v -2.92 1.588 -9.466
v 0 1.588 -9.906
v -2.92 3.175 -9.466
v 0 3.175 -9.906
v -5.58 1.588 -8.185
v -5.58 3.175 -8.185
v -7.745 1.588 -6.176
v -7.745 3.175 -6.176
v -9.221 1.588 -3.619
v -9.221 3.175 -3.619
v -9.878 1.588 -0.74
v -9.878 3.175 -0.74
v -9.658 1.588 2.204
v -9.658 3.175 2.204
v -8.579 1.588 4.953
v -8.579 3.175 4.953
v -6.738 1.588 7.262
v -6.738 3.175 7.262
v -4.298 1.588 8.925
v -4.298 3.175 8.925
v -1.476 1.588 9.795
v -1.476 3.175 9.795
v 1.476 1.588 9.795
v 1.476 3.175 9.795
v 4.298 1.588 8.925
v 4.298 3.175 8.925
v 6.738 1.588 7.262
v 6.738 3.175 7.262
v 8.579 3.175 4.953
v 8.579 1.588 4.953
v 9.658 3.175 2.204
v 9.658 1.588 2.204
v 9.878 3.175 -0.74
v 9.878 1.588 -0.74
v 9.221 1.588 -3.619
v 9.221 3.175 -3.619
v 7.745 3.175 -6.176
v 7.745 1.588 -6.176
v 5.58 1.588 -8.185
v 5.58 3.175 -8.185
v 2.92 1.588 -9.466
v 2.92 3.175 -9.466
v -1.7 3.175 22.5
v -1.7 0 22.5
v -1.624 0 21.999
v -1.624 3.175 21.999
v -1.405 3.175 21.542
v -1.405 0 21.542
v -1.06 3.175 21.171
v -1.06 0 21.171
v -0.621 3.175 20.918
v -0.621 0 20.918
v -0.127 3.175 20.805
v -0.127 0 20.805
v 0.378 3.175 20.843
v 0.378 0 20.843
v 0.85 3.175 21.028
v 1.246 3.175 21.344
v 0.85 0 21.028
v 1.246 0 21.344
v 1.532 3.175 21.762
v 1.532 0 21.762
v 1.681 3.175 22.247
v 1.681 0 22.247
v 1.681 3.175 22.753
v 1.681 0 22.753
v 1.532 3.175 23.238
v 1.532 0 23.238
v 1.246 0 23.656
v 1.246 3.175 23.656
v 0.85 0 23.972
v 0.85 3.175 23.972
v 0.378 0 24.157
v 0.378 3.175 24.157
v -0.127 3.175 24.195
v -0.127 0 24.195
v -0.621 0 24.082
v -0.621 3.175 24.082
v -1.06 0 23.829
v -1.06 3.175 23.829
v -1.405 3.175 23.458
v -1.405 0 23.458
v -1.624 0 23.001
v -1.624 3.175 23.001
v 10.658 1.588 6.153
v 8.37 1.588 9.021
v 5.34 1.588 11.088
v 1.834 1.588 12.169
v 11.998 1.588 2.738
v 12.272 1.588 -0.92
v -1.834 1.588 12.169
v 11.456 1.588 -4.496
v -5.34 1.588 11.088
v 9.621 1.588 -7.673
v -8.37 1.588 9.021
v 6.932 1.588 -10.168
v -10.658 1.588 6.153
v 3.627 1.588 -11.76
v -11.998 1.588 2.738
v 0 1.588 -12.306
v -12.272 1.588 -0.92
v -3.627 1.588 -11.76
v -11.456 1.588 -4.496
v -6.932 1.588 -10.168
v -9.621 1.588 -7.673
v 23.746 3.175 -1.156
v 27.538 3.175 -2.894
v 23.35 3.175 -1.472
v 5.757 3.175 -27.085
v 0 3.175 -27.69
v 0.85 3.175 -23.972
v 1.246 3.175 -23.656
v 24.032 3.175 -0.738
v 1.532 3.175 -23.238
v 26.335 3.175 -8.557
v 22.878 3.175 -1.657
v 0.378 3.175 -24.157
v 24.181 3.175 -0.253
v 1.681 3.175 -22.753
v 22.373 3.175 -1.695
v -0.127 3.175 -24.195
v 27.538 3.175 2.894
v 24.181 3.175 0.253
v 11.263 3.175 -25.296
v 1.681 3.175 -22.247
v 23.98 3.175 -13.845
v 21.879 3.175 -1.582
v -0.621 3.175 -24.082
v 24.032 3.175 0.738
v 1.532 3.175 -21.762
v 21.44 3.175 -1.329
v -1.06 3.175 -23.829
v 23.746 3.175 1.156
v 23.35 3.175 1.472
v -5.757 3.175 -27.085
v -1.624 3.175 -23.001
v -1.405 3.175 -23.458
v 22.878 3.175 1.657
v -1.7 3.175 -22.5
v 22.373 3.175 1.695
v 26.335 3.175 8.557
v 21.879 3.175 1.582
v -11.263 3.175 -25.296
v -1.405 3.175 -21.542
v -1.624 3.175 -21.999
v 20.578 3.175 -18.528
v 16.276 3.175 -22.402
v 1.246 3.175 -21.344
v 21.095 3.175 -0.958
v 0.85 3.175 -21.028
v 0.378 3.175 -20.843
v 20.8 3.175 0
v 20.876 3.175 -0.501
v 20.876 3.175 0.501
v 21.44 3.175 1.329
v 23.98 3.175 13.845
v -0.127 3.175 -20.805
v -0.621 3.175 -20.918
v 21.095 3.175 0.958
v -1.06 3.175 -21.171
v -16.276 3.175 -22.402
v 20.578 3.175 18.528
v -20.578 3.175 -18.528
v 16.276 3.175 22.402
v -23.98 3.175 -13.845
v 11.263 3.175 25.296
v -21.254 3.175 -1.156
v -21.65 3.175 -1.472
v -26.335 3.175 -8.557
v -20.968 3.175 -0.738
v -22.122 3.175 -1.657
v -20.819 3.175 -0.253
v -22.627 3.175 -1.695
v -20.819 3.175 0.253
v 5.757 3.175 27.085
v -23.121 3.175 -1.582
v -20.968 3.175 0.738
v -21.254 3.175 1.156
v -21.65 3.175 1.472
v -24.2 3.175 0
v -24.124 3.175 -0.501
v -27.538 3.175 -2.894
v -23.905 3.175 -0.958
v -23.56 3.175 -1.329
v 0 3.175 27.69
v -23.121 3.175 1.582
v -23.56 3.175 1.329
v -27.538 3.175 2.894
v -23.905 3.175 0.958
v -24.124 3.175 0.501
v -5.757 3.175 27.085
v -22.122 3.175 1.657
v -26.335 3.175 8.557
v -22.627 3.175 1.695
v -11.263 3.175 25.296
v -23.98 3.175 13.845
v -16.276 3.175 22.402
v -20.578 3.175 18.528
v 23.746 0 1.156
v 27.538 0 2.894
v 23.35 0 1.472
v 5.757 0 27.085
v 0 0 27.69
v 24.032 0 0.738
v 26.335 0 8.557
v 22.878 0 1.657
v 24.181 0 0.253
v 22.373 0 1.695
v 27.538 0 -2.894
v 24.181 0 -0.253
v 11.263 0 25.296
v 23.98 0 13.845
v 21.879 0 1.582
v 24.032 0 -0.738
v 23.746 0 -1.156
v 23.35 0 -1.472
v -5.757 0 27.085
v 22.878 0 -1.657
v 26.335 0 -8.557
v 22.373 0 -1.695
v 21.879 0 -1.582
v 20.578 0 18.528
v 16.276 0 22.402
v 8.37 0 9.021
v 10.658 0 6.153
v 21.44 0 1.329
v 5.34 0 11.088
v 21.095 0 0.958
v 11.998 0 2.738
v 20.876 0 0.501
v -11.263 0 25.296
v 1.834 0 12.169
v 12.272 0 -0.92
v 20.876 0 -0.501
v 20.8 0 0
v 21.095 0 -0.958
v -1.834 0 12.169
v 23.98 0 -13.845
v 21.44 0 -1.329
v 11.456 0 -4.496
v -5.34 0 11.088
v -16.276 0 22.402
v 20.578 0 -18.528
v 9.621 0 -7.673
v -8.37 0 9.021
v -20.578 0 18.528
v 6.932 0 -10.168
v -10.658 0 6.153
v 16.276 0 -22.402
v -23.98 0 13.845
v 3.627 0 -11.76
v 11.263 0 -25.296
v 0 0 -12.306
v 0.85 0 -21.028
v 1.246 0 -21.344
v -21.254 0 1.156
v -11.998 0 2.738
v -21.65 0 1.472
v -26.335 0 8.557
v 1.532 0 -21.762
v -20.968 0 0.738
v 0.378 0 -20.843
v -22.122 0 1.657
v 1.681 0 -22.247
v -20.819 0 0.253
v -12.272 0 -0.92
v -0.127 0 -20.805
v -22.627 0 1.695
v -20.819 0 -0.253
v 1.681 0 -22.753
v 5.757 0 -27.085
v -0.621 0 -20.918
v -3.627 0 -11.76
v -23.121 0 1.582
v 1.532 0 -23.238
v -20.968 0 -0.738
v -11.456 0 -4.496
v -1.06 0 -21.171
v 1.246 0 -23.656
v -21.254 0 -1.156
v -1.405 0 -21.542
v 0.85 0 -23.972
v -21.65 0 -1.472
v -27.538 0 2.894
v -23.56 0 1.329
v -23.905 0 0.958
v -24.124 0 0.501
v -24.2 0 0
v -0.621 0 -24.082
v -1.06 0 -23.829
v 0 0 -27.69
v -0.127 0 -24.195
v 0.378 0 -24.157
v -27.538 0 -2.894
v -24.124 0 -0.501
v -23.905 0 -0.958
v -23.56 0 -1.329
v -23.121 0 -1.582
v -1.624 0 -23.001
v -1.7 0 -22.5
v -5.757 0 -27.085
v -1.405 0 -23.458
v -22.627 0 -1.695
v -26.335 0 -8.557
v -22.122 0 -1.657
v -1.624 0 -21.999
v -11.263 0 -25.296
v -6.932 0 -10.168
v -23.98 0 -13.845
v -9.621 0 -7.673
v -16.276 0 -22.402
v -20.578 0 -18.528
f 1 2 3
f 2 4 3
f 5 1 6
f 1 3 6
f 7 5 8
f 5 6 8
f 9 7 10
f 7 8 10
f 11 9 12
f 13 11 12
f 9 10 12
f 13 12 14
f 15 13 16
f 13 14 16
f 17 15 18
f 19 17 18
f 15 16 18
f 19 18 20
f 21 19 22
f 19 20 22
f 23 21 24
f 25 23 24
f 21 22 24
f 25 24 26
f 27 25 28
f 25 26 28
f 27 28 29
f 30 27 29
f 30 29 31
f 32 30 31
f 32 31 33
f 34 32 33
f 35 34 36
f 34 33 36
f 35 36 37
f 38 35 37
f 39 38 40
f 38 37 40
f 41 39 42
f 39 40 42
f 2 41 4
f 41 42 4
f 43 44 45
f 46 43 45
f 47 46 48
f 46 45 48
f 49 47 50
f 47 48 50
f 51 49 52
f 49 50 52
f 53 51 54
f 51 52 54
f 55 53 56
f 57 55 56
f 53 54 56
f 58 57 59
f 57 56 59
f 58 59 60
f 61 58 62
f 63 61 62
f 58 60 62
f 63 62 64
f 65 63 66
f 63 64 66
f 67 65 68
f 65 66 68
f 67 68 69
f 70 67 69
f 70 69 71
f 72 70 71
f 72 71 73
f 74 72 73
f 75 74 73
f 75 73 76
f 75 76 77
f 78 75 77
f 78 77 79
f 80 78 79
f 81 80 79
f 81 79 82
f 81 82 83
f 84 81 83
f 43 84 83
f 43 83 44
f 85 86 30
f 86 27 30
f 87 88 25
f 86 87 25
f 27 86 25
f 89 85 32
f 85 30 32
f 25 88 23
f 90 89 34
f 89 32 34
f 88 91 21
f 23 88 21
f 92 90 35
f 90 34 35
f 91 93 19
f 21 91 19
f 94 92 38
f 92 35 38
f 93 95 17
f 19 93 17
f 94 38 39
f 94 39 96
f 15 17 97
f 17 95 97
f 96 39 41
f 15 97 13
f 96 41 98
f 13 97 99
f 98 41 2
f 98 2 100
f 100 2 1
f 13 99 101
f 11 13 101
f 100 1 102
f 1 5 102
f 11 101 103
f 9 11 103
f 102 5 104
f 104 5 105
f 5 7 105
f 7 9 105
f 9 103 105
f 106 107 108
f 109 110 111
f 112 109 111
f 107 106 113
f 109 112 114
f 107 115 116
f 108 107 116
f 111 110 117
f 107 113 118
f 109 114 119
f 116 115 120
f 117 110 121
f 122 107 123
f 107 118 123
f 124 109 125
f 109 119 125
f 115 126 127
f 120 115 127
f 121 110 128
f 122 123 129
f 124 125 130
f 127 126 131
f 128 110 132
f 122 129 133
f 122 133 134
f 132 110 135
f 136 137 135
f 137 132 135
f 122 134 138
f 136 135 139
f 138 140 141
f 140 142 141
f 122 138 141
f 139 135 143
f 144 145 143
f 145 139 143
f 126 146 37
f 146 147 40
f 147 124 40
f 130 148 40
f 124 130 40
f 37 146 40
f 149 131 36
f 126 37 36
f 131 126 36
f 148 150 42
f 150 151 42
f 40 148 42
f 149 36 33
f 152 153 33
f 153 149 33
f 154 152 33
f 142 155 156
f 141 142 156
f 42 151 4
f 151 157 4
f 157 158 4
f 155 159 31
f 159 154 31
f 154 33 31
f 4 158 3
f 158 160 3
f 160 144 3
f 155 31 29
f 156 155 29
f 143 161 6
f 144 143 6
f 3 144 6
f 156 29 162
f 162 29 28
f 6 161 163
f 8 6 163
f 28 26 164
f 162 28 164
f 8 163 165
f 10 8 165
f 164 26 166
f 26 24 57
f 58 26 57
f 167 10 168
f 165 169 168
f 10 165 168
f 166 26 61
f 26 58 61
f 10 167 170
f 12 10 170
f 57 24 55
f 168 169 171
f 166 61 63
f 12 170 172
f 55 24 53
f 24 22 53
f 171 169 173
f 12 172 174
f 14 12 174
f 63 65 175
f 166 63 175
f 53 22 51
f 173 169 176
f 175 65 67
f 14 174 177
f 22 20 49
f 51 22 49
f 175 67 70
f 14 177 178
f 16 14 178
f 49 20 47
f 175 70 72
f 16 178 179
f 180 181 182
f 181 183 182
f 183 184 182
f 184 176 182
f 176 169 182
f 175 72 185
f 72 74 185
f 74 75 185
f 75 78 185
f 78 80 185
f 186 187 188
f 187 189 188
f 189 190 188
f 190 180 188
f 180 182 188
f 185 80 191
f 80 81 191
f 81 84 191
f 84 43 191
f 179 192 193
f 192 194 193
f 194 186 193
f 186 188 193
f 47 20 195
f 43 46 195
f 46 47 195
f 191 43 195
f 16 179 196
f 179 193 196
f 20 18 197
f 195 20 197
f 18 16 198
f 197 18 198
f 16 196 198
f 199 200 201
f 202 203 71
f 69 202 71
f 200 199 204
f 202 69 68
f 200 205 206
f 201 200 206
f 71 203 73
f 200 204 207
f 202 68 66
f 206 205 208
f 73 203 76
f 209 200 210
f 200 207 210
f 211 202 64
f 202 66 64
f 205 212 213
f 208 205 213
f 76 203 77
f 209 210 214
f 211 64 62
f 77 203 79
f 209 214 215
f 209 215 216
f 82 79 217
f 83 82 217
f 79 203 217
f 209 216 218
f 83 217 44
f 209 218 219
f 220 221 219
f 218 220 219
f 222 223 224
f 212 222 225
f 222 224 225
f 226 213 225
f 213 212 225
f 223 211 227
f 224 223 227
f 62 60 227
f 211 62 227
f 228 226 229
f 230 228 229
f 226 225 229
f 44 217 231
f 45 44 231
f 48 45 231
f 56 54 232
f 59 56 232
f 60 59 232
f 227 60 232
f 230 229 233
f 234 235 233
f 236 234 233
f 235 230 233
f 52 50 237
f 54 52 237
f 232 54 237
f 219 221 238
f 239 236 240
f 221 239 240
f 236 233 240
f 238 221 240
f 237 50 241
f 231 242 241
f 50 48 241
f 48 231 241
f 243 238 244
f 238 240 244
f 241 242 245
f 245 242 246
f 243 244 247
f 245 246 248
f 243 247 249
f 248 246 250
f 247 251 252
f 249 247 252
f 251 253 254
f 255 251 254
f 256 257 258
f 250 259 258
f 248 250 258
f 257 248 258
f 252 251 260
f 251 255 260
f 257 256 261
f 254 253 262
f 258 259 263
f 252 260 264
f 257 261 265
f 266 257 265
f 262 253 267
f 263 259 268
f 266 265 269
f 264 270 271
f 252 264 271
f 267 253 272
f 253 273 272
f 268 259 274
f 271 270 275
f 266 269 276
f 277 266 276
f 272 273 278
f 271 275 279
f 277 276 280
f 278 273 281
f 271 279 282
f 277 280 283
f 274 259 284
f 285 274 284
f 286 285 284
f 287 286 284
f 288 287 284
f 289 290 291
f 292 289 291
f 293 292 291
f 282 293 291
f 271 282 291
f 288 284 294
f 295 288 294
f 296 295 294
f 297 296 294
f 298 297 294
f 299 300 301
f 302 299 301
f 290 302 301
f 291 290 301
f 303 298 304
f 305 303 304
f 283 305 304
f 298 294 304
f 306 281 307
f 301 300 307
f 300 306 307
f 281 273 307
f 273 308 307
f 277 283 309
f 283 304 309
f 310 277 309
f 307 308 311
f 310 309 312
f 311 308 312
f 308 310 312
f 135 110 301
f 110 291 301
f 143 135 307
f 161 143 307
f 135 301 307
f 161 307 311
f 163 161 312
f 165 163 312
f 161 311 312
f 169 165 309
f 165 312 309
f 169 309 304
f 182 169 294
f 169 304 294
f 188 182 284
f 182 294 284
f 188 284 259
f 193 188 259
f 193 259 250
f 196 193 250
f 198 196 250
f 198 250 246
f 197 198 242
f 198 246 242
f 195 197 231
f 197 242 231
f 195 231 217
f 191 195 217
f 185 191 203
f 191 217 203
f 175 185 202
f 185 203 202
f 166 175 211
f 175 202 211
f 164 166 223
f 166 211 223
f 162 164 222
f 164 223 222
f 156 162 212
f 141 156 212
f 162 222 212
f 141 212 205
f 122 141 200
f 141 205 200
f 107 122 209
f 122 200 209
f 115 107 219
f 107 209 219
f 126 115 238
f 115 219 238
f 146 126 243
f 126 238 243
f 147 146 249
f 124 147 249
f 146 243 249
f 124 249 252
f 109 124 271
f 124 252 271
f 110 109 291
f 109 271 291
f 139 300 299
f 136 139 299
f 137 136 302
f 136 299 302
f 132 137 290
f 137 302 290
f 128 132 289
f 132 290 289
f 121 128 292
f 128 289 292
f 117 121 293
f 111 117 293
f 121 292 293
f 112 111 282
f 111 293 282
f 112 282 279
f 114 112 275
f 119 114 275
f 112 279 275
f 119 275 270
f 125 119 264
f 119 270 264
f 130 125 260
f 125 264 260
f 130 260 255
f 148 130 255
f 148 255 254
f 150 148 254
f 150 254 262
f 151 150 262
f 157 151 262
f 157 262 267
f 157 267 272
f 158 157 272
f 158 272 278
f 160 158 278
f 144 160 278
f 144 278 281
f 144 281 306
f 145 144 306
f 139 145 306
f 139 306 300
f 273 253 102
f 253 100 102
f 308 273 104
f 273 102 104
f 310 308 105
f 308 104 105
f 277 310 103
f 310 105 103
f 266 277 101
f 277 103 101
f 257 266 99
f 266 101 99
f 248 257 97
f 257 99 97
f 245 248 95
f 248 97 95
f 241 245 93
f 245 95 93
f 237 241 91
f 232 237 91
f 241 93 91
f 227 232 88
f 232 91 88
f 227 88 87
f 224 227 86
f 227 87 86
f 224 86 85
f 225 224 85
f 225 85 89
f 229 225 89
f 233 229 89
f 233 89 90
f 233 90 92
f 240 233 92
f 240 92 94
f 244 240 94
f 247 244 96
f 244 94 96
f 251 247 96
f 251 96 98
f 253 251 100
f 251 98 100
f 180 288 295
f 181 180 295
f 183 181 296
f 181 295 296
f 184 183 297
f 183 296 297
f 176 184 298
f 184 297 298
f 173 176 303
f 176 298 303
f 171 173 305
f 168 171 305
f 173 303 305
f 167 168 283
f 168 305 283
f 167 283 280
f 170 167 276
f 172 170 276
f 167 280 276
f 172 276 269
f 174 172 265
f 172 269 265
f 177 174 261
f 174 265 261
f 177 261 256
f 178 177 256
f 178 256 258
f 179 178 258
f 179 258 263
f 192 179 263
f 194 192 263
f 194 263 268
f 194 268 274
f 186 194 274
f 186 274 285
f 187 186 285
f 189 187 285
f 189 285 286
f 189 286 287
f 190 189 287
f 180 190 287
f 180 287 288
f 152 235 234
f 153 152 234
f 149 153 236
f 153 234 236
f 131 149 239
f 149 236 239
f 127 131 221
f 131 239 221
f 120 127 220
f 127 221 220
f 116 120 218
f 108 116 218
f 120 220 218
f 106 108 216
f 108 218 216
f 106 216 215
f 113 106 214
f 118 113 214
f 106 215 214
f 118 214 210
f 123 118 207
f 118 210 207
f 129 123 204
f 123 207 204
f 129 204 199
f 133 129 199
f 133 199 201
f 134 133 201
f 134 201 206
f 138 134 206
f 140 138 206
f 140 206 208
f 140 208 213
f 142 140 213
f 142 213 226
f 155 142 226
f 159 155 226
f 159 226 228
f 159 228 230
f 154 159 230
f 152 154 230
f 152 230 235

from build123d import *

# Parameters (mm, degrees)
M3_CLEARANCE_HOLE1_D = 3.4


with BuildPart() as part:
    # Sketch1 → Revolve1 (revolve)
    with BuildSketch(Plane.XY, mode=Mode.PRIVATE) as revolve1_sk:
        Polygon((12.3063, 0), (12.3063, 1.5875), (9.906, 1.5875), (9.906, 3.175), (27.69, 3.175), (27.69, 0), align=None)
    revolve(revolve1_sk.sketch.rotate(Axis((0, 0, 0), (0, 1, 0)), 90), axis=Axis((0, 0, 0), (0, 1, 0)))

    # M3 Clearance Hole1 (through all)
    with Locations(Plane(origin=(0, 3.175, 0), x_dir=(1, 0, 0), z_dir=(0, 1, 0))):
        with Locations((22.5, 0), (0, 22.5), (-22.5, 0), (0, -22.5)):
            Hole(M3_CLEARANCE_HOLE1_D / 2)


solid = part.part
